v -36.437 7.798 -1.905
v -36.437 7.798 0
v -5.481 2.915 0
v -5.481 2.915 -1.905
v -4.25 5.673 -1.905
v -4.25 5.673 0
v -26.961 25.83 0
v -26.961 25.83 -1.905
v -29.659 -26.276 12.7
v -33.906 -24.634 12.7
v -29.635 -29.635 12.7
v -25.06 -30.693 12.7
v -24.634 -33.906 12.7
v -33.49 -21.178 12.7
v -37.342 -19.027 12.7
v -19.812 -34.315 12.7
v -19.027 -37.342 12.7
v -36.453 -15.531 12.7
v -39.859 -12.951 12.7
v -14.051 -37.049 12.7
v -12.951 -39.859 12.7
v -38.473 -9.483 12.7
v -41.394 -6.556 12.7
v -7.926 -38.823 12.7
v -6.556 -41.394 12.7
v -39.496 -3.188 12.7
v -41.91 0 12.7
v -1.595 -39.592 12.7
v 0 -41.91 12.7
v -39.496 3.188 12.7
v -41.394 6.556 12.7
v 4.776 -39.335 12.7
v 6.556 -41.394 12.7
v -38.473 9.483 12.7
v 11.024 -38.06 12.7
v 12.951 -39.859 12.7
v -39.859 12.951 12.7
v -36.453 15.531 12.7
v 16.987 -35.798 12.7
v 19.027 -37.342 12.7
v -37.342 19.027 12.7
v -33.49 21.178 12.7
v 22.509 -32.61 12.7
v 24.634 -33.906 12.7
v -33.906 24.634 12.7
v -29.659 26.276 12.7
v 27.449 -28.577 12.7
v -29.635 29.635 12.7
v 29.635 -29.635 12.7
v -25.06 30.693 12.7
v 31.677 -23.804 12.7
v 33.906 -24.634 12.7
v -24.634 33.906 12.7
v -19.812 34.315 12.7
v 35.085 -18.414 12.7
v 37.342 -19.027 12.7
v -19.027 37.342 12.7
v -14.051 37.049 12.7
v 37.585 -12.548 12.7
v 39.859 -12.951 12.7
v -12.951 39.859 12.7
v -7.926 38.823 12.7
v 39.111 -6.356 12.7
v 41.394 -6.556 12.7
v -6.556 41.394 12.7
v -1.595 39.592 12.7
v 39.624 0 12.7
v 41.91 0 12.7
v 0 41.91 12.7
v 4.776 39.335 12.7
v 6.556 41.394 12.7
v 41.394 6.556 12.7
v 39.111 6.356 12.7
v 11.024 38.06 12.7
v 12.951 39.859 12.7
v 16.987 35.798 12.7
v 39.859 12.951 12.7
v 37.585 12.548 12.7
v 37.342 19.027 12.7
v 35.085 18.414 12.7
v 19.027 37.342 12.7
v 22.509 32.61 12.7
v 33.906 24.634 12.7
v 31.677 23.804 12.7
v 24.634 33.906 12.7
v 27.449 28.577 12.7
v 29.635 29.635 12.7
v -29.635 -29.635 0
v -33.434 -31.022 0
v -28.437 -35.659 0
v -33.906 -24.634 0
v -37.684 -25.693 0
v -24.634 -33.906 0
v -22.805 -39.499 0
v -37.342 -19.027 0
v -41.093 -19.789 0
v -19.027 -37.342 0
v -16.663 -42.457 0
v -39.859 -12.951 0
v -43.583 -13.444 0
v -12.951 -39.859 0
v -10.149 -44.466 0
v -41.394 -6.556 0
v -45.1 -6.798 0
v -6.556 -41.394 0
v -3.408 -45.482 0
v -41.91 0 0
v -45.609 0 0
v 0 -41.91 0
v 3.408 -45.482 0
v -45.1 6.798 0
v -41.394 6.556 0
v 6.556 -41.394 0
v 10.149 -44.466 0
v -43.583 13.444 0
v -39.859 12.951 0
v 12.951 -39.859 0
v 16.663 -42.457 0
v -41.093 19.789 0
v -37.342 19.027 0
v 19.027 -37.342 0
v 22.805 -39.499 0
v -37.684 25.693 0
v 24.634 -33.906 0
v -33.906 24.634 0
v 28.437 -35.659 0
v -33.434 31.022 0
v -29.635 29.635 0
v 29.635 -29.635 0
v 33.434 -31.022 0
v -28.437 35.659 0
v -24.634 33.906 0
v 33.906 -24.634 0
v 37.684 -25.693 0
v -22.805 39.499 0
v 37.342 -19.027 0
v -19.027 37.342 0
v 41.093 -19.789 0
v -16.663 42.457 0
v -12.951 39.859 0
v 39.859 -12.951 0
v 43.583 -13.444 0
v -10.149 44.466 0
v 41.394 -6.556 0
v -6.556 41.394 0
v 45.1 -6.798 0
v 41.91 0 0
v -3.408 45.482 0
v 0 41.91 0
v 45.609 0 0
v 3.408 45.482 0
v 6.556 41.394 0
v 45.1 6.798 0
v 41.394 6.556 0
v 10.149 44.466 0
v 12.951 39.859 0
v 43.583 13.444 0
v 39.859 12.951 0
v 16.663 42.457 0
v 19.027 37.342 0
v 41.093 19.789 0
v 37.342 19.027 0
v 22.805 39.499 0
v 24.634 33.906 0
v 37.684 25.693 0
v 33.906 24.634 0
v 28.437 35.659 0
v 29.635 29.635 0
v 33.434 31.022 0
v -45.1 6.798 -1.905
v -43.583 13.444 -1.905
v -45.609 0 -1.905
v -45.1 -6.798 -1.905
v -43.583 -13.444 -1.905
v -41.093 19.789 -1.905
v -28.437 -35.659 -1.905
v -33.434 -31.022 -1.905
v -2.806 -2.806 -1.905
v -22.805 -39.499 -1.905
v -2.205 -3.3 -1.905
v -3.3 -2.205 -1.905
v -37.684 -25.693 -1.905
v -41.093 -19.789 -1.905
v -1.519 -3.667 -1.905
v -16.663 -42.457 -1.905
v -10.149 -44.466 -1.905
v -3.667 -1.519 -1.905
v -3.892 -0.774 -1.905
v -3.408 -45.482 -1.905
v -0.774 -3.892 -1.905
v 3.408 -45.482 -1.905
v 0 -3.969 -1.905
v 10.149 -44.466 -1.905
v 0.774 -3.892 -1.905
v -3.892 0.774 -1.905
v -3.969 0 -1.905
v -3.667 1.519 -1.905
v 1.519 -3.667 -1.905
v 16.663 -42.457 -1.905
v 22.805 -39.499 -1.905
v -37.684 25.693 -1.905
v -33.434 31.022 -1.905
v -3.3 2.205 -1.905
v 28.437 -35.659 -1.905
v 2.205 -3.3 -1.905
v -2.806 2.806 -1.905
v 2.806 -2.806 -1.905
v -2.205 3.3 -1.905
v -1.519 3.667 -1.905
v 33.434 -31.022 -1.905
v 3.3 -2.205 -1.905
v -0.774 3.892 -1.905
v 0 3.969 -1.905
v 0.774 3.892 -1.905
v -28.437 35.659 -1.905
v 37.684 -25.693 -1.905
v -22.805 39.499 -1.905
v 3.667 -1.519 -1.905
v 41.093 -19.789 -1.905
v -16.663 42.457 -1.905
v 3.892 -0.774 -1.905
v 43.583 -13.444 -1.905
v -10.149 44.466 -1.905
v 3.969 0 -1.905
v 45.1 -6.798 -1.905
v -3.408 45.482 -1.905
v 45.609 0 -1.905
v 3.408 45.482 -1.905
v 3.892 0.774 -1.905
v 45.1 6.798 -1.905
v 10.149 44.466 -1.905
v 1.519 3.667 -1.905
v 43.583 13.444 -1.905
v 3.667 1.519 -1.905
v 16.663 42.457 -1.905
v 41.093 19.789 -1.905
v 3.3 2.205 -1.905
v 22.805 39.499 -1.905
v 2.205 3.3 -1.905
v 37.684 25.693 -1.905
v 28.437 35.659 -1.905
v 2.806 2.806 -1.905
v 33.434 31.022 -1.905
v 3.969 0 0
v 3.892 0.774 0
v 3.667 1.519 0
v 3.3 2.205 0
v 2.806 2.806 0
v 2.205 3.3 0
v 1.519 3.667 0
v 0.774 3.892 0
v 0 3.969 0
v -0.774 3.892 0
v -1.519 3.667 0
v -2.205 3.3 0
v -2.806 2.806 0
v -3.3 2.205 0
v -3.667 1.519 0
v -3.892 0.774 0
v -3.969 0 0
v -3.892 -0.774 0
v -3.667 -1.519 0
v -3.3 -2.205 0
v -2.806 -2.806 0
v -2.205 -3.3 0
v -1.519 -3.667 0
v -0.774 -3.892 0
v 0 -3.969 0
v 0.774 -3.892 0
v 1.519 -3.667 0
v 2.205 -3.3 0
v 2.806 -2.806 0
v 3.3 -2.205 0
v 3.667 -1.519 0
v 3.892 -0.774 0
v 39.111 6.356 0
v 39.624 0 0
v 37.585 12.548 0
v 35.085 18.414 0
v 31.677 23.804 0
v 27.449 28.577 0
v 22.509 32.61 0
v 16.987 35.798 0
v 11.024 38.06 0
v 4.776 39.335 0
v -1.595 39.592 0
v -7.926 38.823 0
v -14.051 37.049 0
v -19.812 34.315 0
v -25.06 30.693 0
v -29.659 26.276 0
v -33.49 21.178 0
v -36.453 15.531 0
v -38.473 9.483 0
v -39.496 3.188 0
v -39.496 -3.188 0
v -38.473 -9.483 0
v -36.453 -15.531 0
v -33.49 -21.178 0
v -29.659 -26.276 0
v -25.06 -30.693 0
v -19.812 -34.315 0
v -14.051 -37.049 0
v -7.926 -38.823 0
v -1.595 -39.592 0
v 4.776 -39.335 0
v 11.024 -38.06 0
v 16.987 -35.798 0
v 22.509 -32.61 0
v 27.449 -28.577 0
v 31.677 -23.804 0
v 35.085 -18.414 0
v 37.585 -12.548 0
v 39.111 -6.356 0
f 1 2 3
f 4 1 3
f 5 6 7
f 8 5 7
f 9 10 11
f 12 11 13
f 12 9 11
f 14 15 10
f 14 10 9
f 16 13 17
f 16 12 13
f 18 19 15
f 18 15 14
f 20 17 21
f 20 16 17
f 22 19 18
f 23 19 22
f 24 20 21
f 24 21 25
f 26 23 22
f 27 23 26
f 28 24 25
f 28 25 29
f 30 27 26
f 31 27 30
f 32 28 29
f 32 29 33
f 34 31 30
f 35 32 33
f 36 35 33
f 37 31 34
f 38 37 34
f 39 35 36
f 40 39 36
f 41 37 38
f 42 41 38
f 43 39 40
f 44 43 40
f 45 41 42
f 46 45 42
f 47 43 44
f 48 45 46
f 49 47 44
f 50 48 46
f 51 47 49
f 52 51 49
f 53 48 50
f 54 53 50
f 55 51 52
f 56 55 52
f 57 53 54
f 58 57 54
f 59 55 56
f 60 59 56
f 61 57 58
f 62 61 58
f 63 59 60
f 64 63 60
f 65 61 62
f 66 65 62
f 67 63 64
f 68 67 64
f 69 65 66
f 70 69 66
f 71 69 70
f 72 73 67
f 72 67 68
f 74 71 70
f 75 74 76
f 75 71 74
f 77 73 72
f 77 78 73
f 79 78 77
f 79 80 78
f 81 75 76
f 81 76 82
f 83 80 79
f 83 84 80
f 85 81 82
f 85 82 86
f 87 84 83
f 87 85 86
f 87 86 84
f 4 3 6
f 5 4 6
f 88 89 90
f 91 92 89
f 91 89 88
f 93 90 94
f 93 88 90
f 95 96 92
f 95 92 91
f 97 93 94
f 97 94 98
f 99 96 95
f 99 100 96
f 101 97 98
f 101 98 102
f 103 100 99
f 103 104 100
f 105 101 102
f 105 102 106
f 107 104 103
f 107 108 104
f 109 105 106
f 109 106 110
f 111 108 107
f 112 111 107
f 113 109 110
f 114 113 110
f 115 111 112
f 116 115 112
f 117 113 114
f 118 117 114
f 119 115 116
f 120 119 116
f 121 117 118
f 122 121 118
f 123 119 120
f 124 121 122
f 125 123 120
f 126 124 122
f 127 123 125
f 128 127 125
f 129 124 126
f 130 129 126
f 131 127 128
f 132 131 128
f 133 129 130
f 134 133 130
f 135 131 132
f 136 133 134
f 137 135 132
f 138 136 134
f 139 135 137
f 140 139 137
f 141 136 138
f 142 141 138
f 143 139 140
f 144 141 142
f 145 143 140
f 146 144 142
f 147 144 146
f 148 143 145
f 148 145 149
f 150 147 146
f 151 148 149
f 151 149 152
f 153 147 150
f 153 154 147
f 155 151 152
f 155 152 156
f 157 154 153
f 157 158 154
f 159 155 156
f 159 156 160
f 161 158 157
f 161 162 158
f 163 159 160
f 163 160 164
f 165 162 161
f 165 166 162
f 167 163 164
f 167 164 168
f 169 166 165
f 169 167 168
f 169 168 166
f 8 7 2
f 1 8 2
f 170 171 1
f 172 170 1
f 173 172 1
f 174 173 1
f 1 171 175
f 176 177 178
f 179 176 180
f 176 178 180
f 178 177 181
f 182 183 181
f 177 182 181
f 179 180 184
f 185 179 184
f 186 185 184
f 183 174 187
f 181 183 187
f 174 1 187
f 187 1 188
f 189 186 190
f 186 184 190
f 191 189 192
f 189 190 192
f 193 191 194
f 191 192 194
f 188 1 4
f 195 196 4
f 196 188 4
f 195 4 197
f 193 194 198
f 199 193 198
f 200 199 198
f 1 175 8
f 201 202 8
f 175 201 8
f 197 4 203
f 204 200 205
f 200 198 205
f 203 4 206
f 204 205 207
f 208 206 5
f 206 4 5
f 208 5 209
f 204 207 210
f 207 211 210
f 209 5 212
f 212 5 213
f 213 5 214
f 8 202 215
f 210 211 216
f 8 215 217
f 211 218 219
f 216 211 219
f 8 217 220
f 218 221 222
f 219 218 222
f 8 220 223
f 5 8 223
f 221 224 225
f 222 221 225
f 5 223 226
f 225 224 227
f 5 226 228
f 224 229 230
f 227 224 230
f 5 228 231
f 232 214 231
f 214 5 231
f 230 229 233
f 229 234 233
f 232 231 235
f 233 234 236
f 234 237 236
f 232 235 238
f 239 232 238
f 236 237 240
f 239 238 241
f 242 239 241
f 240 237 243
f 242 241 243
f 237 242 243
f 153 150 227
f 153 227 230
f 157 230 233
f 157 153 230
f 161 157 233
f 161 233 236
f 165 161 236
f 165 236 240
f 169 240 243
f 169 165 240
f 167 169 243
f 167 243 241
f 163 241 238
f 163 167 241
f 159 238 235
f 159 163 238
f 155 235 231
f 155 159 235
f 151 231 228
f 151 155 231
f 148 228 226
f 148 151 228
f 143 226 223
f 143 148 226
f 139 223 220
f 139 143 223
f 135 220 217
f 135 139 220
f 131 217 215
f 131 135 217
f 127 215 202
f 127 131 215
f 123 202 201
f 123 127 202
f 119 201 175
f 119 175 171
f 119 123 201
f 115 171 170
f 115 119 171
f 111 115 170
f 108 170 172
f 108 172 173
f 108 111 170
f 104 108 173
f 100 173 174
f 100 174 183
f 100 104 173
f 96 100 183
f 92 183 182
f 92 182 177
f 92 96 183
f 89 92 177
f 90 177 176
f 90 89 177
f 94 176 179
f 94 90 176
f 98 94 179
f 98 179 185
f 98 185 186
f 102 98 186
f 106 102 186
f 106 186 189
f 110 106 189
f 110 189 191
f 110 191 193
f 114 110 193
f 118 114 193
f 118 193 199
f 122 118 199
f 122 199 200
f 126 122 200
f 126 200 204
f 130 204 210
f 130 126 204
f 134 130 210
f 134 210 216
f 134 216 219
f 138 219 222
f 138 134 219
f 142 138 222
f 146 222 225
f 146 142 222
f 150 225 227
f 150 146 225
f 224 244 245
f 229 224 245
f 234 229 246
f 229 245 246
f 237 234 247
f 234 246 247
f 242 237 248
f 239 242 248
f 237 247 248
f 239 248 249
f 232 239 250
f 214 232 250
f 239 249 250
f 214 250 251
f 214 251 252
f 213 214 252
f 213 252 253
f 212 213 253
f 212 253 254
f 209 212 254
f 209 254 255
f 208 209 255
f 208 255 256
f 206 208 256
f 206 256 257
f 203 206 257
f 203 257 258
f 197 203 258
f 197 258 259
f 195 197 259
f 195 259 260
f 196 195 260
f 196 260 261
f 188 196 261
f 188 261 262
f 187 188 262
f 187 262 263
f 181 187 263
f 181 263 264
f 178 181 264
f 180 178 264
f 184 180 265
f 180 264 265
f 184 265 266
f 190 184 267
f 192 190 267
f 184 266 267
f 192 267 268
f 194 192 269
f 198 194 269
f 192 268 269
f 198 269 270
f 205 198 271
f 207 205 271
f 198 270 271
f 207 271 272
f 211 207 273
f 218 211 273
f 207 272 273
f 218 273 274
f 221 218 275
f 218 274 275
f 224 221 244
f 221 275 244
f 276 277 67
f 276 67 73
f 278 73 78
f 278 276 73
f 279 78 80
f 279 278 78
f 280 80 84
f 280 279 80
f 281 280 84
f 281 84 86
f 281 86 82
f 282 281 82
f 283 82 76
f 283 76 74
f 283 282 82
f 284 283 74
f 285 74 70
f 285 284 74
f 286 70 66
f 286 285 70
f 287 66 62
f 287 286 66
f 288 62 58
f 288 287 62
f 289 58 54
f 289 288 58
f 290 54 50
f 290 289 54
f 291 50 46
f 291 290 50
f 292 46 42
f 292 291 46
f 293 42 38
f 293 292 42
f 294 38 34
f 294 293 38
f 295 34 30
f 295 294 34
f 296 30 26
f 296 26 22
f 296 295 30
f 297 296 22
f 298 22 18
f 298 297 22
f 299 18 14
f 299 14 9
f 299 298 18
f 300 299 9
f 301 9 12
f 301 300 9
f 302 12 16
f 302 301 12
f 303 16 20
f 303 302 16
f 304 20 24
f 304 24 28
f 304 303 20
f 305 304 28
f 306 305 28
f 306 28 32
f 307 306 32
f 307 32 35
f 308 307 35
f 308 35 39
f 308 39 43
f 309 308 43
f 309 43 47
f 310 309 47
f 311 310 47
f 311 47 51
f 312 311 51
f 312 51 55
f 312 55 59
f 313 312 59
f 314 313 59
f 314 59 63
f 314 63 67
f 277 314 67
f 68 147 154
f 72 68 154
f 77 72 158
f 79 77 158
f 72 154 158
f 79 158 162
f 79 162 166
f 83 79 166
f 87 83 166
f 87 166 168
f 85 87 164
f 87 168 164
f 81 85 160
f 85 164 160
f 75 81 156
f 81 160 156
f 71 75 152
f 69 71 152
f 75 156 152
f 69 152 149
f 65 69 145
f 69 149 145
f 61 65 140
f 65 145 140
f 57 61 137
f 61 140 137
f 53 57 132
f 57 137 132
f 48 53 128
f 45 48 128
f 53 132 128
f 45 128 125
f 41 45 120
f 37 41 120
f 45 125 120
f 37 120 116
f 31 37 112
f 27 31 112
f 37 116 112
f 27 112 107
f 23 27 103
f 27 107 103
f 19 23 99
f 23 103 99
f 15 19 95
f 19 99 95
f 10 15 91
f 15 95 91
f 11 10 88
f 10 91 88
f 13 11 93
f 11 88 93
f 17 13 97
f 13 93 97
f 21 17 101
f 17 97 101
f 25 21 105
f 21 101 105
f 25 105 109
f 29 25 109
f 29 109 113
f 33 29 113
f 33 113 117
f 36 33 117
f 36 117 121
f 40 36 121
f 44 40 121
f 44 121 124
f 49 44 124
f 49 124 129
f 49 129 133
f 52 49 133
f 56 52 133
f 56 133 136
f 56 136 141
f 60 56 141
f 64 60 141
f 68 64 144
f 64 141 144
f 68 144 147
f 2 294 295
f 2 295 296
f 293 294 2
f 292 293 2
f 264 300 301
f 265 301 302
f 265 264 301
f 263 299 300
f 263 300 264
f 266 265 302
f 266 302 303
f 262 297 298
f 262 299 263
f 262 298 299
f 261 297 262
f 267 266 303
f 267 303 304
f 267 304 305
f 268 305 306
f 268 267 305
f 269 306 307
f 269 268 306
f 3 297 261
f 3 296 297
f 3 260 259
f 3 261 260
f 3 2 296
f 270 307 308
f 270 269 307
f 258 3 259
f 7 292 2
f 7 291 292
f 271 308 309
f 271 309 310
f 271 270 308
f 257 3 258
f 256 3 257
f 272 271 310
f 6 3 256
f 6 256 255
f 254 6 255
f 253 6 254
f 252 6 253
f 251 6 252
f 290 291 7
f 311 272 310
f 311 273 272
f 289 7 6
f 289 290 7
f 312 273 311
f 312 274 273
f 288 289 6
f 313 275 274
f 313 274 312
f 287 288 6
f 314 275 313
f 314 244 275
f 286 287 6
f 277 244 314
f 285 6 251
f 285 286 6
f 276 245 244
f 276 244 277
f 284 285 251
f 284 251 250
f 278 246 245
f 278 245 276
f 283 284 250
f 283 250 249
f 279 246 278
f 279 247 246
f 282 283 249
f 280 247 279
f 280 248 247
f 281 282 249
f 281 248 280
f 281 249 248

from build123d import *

# Parameters (mm, degrees)
F0_R     = 41.91
F0_R_2   = 39.624
F1_DEPTH = 12.7
F2_R     = 45.609327
F4_DEPTH = 1.905
F3_R     = 3.96875
F5_DEPTH = 25.4
F7_DEPTH = 5.334


with BuildPart() as f1:
    # F0 (on Top) → F1 (new body)
    with BuildSketch(Plane.XY):
        Circle(F0_R)
        Circle(F0_R_2, mode=Mode.SUBTRACT)
    extrude(amount=F1_DEPTH)

    # F2 (on Top) → F4 (join)
    with BuildSketch(Plane.XY):
        Circle(F2_R)
    extrude(amount=-F4_DEPTH)

    # F3 (on Top) → F5 (cut)
    with BuildSketch(Plane.XY):
        Circle(F3_R)
    extrude(amount=-F5_DEPTH, mode=Mode.SUBTRACT)

    # F6 (on Top) → F7 (cut)
    with BuildSketch(Plane.XY):
        Polygon((-5.480623, 2.9152), (-4.250295, 5.673185), (-26.960552, 25.830237), (-36.436632, 7.79836), align=None)
    extrude(amount=-F7_DEPTH, mode=Mode.SUBTRACT)


solid = f1.part
